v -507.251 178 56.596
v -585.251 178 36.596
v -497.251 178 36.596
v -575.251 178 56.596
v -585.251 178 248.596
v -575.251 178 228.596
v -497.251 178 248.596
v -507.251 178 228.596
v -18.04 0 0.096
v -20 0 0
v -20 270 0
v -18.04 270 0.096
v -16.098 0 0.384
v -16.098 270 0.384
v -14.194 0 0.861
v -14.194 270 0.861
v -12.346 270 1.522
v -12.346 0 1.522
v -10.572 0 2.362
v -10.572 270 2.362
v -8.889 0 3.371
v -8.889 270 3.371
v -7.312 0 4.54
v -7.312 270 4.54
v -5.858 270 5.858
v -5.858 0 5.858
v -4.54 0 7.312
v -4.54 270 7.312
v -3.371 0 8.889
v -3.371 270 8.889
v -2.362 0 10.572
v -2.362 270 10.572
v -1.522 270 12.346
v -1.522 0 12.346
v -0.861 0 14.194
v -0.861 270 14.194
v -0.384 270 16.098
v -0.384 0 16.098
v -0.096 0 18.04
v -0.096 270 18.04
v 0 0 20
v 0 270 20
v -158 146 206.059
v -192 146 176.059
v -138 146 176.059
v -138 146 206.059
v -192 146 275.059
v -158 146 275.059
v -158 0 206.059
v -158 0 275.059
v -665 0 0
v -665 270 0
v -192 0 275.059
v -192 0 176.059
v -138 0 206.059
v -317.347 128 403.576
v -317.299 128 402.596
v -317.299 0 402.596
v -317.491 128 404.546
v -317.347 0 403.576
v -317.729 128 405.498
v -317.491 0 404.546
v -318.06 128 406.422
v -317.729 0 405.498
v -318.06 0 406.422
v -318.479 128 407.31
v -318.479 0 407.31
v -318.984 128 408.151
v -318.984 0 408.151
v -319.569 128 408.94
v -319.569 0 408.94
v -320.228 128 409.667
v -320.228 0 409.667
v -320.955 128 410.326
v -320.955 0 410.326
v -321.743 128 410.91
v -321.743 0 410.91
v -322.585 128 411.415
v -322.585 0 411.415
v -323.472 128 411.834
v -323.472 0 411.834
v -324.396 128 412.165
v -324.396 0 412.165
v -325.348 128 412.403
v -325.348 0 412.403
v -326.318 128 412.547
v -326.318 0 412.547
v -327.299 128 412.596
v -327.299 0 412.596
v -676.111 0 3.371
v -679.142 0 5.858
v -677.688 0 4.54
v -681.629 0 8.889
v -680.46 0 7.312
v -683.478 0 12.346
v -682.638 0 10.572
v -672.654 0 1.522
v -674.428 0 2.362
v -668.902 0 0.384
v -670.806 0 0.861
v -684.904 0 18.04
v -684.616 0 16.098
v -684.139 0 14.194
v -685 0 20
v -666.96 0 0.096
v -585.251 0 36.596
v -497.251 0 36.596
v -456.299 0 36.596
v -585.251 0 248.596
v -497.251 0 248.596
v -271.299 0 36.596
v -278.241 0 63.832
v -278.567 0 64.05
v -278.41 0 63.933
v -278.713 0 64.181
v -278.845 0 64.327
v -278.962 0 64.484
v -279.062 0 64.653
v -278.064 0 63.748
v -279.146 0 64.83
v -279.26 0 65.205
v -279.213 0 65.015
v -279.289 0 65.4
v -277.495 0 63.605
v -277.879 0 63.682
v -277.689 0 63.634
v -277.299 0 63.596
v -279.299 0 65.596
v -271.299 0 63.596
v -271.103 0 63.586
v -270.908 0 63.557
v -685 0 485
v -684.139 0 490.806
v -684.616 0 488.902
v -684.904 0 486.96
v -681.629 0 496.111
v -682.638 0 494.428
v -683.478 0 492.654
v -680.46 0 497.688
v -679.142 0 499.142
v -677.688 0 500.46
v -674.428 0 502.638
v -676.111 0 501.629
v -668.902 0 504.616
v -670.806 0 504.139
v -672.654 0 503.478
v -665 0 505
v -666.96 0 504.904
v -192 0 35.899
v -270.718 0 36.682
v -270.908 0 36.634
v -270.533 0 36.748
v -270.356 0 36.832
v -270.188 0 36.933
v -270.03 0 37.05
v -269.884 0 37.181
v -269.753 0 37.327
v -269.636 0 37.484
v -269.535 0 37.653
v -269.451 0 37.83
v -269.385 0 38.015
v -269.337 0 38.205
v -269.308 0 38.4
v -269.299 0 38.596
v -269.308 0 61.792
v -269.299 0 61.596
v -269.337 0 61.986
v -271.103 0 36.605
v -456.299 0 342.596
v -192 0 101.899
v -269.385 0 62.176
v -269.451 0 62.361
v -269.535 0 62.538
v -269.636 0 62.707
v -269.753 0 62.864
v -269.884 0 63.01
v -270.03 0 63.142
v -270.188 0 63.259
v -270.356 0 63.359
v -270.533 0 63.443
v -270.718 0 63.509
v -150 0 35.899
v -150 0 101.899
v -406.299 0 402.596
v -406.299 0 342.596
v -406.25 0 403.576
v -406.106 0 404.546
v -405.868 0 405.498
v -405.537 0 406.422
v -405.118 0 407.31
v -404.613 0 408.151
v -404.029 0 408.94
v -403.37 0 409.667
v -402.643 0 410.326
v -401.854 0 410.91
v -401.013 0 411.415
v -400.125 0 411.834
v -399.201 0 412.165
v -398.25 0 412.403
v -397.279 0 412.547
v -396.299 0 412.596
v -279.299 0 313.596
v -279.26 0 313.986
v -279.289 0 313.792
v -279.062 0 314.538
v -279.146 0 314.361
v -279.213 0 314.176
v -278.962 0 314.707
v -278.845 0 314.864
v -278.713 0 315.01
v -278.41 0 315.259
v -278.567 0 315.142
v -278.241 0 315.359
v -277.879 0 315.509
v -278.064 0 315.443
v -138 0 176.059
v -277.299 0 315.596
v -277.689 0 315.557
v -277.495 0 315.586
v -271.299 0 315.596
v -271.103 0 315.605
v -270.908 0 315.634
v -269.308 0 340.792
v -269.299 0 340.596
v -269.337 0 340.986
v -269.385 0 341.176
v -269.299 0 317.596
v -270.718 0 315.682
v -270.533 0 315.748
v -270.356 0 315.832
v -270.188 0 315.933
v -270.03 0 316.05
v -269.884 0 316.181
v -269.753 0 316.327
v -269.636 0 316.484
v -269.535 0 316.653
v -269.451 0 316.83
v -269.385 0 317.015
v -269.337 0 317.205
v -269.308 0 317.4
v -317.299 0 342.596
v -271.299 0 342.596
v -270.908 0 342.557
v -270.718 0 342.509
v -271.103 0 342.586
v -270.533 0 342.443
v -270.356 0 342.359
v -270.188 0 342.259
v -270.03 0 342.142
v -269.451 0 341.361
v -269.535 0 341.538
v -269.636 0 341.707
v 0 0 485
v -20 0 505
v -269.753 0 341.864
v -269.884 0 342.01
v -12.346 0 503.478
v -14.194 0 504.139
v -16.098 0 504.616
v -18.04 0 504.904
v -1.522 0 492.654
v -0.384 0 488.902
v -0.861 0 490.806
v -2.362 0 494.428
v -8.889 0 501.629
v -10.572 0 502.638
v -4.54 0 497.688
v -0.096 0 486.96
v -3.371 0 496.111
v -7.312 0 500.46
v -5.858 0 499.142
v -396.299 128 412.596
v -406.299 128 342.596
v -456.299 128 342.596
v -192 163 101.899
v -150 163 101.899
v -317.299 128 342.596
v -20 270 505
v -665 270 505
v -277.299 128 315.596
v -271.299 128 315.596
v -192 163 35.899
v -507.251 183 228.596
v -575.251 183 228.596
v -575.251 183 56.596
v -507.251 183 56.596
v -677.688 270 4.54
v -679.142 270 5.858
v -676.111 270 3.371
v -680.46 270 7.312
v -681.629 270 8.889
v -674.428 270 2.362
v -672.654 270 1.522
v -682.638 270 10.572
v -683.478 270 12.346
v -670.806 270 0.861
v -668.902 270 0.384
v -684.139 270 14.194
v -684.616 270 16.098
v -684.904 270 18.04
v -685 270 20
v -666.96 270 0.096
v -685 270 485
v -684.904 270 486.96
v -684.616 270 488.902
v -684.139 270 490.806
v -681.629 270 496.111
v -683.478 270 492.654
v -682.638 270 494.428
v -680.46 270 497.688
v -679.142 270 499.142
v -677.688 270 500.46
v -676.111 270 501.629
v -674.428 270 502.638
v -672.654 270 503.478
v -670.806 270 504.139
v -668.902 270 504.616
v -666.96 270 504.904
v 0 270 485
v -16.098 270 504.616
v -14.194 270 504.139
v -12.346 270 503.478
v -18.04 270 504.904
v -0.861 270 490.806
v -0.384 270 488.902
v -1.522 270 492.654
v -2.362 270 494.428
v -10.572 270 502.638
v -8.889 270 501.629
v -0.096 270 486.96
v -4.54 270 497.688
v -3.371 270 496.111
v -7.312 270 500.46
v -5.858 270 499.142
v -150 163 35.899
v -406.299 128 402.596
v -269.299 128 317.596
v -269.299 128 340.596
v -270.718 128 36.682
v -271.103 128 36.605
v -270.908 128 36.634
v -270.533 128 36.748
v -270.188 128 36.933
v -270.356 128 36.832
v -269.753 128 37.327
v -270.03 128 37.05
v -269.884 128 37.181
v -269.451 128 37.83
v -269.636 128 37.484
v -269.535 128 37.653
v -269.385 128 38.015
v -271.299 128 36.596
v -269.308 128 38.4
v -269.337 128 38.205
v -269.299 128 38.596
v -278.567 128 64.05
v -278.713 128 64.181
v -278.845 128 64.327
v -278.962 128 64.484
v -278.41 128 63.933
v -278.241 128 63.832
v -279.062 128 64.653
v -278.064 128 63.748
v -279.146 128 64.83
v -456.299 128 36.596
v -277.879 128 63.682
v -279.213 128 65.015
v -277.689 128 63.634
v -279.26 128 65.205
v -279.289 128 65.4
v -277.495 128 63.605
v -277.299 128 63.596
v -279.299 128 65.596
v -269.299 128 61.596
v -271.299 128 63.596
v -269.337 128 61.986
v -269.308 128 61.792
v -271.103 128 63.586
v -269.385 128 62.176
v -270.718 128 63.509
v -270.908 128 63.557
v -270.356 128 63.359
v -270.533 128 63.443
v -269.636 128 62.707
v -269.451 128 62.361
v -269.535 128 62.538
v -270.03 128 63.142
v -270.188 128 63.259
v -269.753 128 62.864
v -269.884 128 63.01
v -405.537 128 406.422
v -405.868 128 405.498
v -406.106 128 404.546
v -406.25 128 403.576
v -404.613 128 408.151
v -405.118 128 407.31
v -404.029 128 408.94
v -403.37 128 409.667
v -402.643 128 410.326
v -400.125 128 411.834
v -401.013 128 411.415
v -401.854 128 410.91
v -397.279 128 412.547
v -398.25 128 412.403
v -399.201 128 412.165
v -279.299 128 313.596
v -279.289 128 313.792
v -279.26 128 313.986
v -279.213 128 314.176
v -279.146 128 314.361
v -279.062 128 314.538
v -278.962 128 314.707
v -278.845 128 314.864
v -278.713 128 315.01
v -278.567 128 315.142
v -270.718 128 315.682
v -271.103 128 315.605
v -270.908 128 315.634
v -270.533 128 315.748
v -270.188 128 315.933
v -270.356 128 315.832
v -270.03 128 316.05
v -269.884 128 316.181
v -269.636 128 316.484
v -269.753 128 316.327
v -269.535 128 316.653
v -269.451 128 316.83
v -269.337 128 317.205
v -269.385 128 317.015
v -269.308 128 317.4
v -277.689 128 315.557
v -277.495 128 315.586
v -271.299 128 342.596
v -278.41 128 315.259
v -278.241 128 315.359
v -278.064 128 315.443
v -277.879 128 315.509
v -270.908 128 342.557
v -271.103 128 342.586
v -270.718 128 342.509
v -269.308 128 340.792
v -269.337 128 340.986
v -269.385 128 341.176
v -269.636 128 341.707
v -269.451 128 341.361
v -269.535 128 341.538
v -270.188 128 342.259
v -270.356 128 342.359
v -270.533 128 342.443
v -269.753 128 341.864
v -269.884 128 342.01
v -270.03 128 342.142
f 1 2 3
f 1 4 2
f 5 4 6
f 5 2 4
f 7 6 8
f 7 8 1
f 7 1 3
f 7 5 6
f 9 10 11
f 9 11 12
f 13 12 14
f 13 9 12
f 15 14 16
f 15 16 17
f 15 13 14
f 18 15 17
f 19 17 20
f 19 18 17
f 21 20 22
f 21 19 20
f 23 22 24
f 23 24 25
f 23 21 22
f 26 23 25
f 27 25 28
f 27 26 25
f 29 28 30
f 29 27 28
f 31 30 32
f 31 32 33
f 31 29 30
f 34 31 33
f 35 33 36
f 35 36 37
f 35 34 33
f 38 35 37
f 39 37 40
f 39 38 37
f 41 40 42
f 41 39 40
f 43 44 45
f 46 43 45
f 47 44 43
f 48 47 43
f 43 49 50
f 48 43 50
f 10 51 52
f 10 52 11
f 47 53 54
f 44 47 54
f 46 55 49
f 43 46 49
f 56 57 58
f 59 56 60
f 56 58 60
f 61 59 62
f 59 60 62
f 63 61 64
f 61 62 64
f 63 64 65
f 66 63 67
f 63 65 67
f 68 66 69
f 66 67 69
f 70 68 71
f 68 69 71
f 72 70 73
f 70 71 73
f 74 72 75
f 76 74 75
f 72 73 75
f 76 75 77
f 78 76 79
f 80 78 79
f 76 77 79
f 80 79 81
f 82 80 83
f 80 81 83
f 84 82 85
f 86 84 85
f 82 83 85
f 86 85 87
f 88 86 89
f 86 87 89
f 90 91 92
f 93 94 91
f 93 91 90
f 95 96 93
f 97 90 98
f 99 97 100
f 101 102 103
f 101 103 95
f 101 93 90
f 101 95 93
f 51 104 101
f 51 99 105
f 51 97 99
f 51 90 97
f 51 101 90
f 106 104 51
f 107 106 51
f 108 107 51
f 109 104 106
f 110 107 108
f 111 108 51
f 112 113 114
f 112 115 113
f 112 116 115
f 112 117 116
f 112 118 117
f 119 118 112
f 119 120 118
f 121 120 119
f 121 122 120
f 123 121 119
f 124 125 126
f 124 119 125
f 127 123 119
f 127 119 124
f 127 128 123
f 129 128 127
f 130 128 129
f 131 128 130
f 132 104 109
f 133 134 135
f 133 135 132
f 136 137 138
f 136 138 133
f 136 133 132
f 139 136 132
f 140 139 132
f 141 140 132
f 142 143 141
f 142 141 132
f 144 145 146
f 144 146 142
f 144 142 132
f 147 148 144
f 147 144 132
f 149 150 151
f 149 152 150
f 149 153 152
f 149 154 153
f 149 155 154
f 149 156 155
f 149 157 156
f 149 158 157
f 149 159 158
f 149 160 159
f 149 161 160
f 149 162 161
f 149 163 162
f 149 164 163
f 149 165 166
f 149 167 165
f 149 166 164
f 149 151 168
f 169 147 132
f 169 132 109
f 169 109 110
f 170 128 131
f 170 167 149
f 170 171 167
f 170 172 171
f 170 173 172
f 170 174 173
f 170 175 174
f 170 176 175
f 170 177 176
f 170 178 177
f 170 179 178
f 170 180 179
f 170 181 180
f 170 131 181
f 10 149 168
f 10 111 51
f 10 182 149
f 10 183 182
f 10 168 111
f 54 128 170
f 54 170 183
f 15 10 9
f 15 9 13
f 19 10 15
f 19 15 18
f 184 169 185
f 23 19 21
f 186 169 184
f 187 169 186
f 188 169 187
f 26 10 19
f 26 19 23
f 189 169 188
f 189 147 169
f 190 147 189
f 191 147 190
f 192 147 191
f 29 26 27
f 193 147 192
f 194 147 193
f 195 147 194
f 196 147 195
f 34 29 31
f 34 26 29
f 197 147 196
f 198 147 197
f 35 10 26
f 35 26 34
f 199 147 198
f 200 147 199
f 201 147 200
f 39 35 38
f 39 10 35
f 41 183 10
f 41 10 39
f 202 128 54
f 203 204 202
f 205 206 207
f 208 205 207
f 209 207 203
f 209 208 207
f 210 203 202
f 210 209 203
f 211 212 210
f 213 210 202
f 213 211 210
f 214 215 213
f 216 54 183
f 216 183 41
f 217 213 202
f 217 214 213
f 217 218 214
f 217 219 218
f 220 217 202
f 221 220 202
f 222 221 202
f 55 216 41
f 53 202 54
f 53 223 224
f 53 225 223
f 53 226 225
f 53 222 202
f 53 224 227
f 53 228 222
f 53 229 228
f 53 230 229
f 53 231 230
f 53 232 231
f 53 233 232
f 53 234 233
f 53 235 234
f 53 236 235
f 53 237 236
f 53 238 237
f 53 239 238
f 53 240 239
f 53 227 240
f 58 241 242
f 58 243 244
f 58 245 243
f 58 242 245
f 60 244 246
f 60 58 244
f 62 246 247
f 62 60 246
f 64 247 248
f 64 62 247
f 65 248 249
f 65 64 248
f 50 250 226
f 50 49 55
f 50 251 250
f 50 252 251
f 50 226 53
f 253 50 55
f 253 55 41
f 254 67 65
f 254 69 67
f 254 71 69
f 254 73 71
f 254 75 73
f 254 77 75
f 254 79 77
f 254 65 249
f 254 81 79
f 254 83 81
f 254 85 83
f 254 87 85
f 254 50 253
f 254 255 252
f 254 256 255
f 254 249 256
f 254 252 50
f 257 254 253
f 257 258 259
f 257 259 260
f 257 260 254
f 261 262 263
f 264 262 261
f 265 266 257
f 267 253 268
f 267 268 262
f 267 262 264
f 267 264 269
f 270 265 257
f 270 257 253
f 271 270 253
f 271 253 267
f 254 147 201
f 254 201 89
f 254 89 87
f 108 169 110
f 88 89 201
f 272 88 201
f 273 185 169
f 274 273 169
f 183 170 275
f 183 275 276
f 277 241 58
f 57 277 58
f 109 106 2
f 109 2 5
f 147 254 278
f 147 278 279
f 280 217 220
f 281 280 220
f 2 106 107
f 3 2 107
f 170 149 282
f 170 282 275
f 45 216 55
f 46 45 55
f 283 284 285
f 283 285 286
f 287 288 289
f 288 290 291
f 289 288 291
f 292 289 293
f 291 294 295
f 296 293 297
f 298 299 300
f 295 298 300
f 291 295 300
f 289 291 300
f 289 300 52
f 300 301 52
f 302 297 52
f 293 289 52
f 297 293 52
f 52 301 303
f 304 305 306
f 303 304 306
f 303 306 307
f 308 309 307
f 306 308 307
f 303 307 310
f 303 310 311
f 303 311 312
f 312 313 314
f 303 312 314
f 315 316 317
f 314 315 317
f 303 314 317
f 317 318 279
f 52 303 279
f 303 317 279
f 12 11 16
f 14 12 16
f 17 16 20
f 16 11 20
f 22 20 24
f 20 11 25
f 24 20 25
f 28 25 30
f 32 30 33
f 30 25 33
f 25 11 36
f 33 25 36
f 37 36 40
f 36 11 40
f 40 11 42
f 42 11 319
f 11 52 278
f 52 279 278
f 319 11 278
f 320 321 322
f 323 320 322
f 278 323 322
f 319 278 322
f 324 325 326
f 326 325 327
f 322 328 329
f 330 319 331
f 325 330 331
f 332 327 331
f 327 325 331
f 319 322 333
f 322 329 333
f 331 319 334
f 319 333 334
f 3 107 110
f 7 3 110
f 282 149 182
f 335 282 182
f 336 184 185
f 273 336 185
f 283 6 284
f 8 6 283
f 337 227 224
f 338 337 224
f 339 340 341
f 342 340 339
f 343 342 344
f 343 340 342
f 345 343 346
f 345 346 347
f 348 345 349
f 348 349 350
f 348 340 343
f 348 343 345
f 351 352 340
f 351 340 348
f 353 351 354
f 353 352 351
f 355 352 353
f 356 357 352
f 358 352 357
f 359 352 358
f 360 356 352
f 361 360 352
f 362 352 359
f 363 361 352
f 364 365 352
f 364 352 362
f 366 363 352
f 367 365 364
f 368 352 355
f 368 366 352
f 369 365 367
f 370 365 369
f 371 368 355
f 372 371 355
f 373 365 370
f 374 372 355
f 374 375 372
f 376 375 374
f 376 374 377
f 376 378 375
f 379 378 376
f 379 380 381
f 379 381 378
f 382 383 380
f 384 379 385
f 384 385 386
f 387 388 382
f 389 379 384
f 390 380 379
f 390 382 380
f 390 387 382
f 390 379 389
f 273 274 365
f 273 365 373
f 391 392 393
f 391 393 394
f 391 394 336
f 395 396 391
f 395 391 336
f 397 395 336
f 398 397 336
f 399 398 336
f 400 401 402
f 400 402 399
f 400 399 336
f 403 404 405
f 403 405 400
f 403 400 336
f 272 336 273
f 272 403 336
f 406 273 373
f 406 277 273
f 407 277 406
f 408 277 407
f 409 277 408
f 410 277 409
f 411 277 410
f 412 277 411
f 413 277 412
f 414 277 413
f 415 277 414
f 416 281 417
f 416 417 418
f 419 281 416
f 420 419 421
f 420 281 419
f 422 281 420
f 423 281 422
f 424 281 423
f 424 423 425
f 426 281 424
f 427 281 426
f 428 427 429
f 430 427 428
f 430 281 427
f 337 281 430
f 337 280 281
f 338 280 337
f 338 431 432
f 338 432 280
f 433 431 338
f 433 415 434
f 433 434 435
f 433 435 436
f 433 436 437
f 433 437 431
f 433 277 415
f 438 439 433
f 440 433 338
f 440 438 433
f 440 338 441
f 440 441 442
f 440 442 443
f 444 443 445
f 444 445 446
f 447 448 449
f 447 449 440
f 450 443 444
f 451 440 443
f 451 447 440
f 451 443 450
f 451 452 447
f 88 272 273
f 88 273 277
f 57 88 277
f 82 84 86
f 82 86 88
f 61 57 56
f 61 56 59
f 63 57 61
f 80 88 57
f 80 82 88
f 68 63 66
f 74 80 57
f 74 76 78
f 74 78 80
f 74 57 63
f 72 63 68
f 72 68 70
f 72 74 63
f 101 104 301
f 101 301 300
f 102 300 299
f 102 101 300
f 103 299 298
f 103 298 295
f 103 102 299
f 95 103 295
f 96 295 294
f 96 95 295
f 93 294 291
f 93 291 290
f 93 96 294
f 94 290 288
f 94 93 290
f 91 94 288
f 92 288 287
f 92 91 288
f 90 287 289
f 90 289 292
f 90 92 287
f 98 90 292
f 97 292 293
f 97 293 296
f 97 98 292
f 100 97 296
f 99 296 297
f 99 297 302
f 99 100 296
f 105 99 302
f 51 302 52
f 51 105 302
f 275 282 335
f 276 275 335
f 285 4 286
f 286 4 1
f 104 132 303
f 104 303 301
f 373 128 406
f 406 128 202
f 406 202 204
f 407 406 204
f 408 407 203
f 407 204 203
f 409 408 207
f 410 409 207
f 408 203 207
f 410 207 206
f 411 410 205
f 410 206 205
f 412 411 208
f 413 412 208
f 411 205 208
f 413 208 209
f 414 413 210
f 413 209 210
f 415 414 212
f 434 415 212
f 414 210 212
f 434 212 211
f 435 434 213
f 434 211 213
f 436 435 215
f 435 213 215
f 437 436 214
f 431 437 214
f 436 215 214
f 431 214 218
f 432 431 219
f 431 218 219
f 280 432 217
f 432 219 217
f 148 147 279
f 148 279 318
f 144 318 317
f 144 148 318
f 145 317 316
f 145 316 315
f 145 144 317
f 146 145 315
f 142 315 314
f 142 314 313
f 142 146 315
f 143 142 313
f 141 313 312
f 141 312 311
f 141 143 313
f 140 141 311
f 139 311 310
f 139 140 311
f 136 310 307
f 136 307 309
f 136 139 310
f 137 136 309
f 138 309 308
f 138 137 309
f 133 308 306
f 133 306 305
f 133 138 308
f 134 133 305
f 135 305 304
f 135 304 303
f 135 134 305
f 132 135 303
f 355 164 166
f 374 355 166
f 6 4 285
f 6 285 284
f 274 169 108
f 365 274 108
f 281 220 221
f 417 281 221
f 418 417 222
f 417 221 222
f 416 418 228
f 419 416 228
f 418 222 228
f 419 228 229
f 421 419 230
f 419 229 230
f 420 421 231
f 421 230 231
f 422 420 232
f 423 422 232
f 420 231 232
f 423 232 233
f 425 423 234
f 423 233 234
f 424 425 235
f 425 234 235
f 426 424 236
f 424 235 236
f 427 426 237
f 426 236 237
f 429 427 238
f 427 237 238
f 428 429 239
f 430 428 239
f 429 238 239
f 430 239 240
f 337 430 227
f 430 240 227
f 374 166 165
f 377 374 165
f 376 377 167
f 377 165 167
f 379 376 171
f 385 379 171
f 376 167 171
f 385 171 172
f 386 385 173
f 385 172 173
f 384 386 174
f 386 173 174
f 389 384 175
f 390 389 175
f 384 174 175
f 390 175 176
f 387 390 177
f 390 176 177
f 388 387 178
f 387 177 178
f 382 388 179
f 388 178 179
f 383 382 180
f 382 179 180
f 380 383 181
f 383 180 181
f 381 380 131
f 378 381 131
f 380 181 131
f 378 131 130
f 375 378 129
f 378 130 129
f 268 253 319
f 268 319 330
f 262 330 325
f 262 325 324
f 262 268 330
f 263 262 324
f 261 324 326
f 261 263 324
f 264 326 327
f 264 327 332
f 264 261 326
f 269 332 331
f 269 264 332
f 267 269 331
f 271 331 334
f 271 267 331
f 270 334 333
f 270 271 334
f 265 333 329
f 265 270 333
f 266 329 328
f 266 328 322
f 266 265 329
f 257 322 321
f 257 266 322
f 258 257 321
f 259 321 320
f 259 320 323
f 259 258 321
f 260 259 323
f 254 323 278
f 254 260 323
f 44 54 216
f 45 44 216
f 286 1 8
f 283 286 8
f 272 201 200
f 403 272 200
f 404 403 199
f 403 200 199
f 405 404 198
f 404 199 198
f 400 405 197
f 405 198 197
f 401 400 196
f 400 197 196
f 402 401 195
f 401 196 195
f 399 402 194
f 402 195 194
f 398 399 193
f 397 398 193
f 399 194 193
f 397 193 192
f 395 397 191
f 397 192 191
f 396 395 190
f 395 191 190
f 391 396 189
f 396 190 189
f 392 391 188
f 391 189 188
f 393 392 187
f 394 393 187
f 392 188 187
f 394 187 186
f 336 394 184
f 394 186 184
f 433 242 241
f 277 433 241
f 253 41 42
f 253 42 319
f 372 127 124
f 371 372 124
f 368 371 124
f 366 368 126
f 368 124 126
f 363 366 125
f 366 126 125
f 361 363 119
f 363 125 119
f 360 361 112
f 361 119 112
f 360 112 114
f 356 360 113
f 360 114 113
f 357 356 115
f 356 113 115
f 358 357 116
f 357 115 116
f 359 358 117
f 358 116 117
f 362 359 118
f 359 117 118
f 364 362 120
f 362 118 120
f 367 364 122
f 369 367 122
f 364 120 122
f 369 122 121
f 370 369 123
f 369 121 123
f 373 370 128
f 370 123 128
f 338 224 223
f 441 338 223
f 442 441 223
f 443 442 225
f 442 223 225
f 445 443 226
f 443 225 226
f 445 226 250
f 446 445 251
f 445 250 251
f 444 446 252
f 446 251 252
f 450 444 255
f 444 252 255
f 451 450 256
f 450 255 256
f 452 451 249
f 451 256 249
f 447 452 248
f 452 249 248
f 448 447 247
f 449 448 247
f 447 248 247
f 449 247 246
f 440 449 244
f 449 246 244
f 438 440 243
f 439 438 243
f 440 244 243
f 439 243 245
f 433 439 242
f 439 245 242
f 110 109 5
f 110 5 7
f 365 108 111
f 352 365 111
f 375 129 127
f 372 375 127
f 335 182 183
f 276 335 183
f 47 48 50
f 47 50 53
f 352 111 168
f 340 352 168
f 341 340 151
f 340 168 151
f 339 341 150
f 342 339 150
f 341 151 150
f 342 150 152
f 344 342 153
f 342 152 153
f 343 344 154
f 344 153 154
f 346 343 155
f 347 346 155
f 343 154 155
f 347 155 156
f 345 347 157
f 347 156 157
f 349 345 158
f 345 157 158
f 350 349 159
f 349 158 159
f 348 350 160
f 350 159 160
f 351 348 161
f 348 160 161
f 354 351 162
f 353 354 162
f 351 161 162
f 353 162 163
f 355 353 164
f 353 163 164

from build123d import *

# Parameters (mm, degrees)
F1_DEPTH  = 270
F2_W      = 88
F2_H      = 212
F3_DEPTH  = 178
F4_W      = 68
F4_H      = 172
F5_DEPTH  = 5
F7_DEPTH  = 128
F8_W      = 42
F8_H      = 66
F9_DEPTH  = 163
F11_DEPTH = 146


with BuildPart() as f1:
    # F0 (on Front) → F1 (new body)
    with BuildSketch(Plane.XZ):
        with BuildLine():
            Line((-20, 505), (-665, 505))
            ThreePointArc((-665, 505), (-679.142136, 499.142136), (-685, 485))
            Line((-685, 485), (-685, 20))
            ThreePointArc((-685, 20), (-679.142136, 5.857864), (-665, 0))
            Line((-665, 0), (-20, 0))
            ThreePointArc((-20, 0), (-5.857864, 5.857864), (0, 20))
            Line((0, 20), (0, 485))
            ThreePointArc((0, 485), (-5.857864, 499.142136), (-20, 505))
        make_face()
    extrude(amount=-F1_DEPTH)

    # F2 (on face) → F3 (cut)
    with BuildSketch(Plane.XZ):
        with Locations((-541.250854, 142.595568)):
            Rectangle(F2_W, F2_H)
    extrude(amount=-F3_DEPTH, mode=Mode.SUBTRACT)

    # F4 (on face) → F5 (cut)
    with BuildSketch(Plane.XZ.offset(-178)):
        with Locations((-541.250854, 142.595568)):
            Rectangle(F4_W, F4_H)
    extrude(amount=-F5_DEPTH, mode=Mode.SUBTRACT)

    # F6 (on face) → F7 (cut)
    with BuildSketch(Plane.XZ):
        with BuildLine():
            Line((-456.298642, 342.595568), (-456.298642, 36.595568))
            Line((-456.298642, 36.595568), (-279.298642, 36.595568))
            Line((-279.298642, 36.595568), (-271.298642, 36.595568))
            ThreePointArc((-271.298642, 36.595568), (-269.884428, 37.181354), (-269.298642, 38.595568))
            Line((-269.298642, 38.595568), (-269.298642, 61.595568))
            ThreePointArc((-269.298642, 61.595568), (-269.884428, 63.009782), (-271.298642, 63.595568))
            Line((-271.298642, 63.595568), (-277.298642, 63.595568))
            ThreePointArc((-277.298642, 63.595568), (-278.712855, 64.181354), (-279.298642, 65.595568))
            Line((-279.298642, 65.595568), (-279.298642, 313.595568))
            ThreePointArc((-279.298642, 313.595568), (-278.712855, 315.009782), (-277.298642, 315.595568))
            Line((-277.298642, 315.595568), (-271.298642, 315.595568))
            ThreePointArc((-271.298642, 315.595568), (-269.884428, 316.181354), (-269.298642, 317.595568))
            Line((-269.298642, 317.595568), (-269.298642, 340.595568))
            ThreePointArc((-269.298642, 340.595568), (-269.884428, 342.009782), (-271.298642, 342.595568))
            Line((-271.298642, 342.595568), (-317.298642, 342.595568))
            Line((-317.298642, 342.595568), (-317.298642, 402.595568))
            ThreePointArc((-317.298642, 402.595568), (-320.227574, 409.666636), (-327.298642, 412.595568))
            Line((-327.298642, 412.595568), (-396.298642, 412.595568))
            ThreePointArc((-396.298642, 412.595568), (-403.36971, 409.666636), (-406.298642, 402.595568))
            Line((-406.298642, 402.595568), (-406.298642, 342.595568))
            Line((-406.298642, 342.595568), (-456.298642, 342.595568))
        make_face()
    extrude(amount=-F7_DEPTH, mode=Mode.SUBTRACT)

    # F8 (on face) → F9 (cut)
    with BuildSketch(Plane.XZ):
        with Locations((-171, 68.898773)):
            Rectangle(F8_W, F8_H)
    extrude(amount=-F9_DEPTH, mode=Mode.SUBTRACT)

    # F10 (on face) → F11 (cut)
    with BuildSketch(Plane.XZ):
        Polygon((-192, 275.058829), (-192, 176.058829), (-138, 176.058829), (-138, 206.058829), (-158, 206.058829), (-158, 275.058829), align=None)
    extrude(amount=-F11_DEPTH, mode=Mode.SUBTRACT)


solid = f1.part
